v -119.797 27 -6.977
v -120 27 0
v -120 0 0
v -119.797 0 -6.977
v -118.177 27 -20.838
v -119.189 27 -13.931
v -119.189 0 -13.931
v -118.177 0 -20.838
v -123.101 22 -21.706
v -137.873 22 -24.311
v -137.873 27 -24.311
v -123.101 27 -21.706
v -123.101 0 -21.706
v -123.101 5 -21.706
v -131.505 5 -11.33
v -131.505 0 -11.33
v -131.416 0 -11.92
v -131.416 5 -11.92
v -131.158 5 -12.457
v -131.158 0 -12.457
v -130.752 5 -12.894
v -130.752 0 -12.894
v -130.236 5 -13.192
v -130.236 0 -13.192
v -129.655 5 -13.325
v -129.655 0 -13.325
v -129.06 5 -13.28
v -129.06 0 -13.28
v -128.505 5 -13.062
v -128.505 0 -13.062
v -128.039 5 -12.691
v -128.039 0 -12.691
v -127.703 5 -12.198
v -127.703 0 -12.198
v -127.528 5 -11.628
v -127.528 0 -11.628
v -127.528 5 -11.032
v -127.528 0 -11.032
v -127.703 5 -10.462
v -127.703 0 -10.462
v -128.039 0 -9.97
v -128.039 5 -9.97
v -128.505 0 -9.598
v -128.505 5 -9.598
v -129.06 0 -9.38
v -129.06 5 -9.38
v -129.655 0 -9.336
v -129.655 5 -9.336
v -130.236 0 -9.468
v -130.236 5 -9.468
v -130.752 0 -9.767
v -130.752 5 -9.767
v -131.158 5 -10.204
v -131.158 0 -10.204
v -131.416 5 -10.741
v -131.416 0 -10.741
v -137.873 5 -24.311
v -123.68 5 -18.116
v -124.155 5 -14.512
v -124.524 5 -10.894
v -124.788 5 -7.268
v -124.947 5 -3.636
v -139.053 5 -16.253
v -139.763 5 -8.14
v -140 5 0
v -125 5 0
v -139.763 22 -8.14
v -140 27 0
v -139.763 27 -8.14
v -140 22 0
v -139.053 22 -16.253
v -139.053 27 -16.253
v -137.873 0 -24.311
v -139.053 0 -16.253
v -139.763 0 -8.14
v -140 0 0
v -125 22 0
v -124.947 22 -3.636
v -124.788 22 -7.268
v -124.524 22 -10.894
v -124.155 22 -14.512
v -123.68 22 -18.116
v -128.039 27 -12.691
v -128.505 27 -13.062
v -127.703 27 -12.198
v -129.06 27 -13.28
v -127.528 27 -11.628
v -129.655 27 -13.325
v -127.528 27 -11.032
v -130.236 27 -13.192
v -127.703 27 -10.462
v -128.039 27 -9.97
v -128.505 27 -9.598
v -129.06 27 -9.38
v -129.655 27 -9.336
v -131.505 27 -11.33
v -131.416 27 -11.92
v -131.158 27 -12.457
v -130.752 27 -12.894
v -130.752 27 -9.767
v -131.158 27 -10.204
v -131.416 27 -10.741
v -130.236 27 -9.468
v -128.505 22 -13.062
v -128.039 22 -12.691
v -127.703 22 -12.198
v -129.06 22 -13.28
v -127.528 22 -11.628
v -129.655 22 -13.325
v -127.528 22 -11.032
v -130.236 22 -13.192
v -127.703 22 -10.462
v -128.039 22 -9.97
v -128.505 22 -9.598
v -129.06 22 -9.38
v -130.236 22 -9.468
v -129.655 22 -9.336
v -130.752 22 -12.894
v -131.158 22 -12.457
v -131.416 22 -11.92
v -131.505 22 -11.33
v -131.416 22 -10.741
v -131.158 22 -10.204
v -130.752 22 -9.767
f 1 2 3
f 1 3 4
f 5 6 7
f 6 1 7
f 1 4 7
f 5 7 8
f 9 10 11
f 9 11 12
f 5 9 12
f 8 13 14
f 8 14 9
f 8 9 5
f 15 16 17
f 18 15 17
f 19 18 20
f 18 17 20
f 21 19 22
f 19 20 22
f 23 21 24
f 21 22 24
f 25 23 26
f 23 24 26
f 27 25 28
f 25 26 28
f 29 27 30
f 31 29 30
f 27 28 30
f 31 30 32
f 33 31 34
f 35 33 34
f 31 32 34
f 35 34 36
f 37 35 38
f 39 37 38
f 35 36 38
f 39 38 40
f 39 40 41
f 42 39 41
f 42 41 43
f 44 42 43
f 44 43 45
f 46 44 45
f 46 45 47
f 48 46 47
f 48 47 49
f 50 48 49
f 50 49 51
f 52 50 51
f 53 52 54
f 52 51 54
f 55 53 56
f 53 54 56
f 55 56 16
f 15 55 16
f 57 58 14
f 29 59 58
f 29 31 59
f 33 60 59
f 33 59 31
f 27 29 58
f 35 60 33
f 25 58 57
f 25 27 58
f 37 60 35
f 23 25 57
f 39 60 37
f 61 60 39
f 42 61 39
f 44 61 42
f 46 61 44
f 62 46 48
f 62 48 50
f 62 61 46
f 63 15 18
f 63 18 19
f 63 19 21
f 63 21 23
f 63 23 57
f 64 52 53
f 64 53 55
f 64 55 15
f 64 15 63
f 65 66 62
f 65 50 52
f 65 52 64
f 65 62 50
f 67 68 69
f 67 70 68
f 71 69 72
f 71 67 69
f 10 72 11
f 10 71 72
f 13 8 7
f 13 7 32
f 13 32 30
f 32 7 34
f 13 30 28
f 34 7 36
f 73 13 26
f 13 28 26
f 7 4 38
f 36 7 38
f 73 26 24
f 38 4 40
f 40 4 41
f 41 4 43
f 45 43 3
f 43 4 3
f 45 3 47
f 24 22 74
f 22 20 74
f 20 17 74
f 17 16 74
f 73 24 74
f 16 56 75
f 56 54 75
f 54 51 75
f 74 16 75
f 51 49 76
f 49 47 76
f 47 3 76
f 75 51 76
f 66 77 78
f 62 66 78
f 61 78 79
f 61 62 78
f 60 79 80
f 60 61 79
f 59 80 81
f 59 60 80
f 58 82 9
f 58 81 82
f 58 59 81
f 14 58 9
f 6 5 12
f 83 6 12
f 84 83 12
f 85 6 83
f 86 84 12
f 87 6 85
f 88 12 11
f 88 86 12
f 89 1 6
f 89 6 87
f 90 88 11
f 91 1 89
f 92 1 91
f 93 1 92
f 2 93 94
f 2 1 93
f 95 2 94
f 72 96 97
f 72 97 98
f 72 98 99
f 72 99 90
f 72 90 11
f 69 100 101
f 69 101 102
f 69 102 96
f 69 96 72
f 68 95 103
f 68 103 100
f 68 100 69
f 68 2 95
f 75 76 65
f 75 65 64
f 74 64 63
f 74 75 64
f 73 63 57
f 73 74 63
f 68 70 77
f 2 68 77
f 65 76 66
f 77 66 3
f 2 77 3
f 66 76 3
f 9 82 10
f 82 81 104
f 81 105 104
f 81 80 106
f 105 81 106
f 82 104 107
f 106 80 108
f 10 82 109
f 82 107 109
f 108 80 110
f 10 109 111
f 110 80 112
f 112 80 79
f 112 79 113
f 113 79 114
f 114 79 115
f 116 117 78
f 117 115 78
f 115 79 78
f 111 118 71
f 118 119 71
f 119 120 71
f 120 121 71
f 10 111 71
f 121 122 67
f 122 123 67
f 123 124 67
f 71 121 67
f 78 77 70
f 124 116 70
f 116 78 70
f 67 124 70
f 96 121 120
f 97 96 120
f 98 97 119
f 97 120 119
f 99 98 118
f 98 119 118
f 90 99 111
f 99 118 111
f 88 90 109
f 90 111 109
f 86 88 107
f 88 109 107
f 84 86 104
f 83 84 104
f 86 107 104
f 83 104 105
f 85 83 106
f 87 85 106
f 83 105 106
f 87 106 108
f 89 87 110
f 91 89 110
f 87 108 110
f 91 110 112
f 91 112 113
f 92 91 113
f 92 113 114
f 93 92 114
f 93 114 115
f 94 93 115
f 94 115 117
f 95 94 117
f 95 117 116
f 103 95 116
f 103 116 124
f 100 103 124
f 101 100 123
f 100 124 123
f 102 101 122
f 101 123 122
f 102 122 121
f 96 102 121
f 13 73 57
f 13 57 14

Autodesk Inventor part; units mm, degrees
ref_plane "YZ Plane" through (0, 0, 0) normal (1, 0, 0) x (0, 1, 0)
ref_plane "XZ Plane" through (0, 0, 0) normal (0, 1, 0) x (-1, 0, 0)
ref_plane "XY Plane" through (0, 0, 0) normal (0, 0, 1) x (1, 0, 0)
sketch "Sketch1" plane through (0, 0, 0) normal (0, 1, 0) x (-1, 0, 0)
  line L0 (0, 0) -> (125, 0) construction
  line L1 (0, 0) -> (125, 0) construction
  line L2 (0, 0) -> (123.101, -21.706) construction
  line L3 (0, 0) -> (300, 0) construction
  line L4 (0, 0) -> (300, 0) construction
  line L5 (140, 0) -> (125, 0)
  line L6 (137.8731, -24.3107) -> (123.101, -21.706)
  line L7 (124.5243, -10.8945) -> (129.5053, -11.3302)
  circle A0 centre (129.5053, -11.3302) radius 2
  arc A1 (137.8731, -24.3107) -> (140, 0) centre (0, 0) ccw
  arc A2 (123.101, -21.706) -> (124.5243, -10.8945) centre (0, 0) ccw
  arc A3 (124.5243, -10.8945) -> (125, 0) centre (0, 0) ccw
  dimension "d1" = 0
  dimension "d2" = 10
  dimension "d4" = 0
  dimension "d7" = 5
  dimension "d8" = 5
  dimension "d9" = 4
  dimension "d28" = 140
  dimension "d29" = 125
  dimension "d31" = 14.7721
extrude "Extrusion1" add sketch "Sketch1" along normal blind 5
sketch "Sketch3" plane through (0, 5, 0) normal (0, 1, 0) x (1, 0, 0)
  arc A0 (-123.101, 21.706) -> (-125, 0) centre (0, 0) ccw projected
  arc A1 (-123.101, 21.706) -> (-125, 0) centre (0, 0) ccw
  arc A2 (-118.1769, 20.8378) -> (-120, 0) centre (0, 0) ccw
  line L0 (0, 0) -> (-118.1769, 20.8378) construction
  line L1 (0, 0) -> (-120, 0) construction
  line L2 (-123.101, 21.706) -> (-118.1769, 20.8378)
  line L3 (-125, 0) -> (-120, 0)
  dimension "d33" = 120
  dimension "d34" = 10
extrude "Extrusion4" add sketch "Sketch3" along normal blind 27 from surface at -5
pattern_linear "Rectangular Pattern3" count 2 spacing 22 along (0, 1, 0) of "Extrusion1"
properties part number "Inner_mount"
